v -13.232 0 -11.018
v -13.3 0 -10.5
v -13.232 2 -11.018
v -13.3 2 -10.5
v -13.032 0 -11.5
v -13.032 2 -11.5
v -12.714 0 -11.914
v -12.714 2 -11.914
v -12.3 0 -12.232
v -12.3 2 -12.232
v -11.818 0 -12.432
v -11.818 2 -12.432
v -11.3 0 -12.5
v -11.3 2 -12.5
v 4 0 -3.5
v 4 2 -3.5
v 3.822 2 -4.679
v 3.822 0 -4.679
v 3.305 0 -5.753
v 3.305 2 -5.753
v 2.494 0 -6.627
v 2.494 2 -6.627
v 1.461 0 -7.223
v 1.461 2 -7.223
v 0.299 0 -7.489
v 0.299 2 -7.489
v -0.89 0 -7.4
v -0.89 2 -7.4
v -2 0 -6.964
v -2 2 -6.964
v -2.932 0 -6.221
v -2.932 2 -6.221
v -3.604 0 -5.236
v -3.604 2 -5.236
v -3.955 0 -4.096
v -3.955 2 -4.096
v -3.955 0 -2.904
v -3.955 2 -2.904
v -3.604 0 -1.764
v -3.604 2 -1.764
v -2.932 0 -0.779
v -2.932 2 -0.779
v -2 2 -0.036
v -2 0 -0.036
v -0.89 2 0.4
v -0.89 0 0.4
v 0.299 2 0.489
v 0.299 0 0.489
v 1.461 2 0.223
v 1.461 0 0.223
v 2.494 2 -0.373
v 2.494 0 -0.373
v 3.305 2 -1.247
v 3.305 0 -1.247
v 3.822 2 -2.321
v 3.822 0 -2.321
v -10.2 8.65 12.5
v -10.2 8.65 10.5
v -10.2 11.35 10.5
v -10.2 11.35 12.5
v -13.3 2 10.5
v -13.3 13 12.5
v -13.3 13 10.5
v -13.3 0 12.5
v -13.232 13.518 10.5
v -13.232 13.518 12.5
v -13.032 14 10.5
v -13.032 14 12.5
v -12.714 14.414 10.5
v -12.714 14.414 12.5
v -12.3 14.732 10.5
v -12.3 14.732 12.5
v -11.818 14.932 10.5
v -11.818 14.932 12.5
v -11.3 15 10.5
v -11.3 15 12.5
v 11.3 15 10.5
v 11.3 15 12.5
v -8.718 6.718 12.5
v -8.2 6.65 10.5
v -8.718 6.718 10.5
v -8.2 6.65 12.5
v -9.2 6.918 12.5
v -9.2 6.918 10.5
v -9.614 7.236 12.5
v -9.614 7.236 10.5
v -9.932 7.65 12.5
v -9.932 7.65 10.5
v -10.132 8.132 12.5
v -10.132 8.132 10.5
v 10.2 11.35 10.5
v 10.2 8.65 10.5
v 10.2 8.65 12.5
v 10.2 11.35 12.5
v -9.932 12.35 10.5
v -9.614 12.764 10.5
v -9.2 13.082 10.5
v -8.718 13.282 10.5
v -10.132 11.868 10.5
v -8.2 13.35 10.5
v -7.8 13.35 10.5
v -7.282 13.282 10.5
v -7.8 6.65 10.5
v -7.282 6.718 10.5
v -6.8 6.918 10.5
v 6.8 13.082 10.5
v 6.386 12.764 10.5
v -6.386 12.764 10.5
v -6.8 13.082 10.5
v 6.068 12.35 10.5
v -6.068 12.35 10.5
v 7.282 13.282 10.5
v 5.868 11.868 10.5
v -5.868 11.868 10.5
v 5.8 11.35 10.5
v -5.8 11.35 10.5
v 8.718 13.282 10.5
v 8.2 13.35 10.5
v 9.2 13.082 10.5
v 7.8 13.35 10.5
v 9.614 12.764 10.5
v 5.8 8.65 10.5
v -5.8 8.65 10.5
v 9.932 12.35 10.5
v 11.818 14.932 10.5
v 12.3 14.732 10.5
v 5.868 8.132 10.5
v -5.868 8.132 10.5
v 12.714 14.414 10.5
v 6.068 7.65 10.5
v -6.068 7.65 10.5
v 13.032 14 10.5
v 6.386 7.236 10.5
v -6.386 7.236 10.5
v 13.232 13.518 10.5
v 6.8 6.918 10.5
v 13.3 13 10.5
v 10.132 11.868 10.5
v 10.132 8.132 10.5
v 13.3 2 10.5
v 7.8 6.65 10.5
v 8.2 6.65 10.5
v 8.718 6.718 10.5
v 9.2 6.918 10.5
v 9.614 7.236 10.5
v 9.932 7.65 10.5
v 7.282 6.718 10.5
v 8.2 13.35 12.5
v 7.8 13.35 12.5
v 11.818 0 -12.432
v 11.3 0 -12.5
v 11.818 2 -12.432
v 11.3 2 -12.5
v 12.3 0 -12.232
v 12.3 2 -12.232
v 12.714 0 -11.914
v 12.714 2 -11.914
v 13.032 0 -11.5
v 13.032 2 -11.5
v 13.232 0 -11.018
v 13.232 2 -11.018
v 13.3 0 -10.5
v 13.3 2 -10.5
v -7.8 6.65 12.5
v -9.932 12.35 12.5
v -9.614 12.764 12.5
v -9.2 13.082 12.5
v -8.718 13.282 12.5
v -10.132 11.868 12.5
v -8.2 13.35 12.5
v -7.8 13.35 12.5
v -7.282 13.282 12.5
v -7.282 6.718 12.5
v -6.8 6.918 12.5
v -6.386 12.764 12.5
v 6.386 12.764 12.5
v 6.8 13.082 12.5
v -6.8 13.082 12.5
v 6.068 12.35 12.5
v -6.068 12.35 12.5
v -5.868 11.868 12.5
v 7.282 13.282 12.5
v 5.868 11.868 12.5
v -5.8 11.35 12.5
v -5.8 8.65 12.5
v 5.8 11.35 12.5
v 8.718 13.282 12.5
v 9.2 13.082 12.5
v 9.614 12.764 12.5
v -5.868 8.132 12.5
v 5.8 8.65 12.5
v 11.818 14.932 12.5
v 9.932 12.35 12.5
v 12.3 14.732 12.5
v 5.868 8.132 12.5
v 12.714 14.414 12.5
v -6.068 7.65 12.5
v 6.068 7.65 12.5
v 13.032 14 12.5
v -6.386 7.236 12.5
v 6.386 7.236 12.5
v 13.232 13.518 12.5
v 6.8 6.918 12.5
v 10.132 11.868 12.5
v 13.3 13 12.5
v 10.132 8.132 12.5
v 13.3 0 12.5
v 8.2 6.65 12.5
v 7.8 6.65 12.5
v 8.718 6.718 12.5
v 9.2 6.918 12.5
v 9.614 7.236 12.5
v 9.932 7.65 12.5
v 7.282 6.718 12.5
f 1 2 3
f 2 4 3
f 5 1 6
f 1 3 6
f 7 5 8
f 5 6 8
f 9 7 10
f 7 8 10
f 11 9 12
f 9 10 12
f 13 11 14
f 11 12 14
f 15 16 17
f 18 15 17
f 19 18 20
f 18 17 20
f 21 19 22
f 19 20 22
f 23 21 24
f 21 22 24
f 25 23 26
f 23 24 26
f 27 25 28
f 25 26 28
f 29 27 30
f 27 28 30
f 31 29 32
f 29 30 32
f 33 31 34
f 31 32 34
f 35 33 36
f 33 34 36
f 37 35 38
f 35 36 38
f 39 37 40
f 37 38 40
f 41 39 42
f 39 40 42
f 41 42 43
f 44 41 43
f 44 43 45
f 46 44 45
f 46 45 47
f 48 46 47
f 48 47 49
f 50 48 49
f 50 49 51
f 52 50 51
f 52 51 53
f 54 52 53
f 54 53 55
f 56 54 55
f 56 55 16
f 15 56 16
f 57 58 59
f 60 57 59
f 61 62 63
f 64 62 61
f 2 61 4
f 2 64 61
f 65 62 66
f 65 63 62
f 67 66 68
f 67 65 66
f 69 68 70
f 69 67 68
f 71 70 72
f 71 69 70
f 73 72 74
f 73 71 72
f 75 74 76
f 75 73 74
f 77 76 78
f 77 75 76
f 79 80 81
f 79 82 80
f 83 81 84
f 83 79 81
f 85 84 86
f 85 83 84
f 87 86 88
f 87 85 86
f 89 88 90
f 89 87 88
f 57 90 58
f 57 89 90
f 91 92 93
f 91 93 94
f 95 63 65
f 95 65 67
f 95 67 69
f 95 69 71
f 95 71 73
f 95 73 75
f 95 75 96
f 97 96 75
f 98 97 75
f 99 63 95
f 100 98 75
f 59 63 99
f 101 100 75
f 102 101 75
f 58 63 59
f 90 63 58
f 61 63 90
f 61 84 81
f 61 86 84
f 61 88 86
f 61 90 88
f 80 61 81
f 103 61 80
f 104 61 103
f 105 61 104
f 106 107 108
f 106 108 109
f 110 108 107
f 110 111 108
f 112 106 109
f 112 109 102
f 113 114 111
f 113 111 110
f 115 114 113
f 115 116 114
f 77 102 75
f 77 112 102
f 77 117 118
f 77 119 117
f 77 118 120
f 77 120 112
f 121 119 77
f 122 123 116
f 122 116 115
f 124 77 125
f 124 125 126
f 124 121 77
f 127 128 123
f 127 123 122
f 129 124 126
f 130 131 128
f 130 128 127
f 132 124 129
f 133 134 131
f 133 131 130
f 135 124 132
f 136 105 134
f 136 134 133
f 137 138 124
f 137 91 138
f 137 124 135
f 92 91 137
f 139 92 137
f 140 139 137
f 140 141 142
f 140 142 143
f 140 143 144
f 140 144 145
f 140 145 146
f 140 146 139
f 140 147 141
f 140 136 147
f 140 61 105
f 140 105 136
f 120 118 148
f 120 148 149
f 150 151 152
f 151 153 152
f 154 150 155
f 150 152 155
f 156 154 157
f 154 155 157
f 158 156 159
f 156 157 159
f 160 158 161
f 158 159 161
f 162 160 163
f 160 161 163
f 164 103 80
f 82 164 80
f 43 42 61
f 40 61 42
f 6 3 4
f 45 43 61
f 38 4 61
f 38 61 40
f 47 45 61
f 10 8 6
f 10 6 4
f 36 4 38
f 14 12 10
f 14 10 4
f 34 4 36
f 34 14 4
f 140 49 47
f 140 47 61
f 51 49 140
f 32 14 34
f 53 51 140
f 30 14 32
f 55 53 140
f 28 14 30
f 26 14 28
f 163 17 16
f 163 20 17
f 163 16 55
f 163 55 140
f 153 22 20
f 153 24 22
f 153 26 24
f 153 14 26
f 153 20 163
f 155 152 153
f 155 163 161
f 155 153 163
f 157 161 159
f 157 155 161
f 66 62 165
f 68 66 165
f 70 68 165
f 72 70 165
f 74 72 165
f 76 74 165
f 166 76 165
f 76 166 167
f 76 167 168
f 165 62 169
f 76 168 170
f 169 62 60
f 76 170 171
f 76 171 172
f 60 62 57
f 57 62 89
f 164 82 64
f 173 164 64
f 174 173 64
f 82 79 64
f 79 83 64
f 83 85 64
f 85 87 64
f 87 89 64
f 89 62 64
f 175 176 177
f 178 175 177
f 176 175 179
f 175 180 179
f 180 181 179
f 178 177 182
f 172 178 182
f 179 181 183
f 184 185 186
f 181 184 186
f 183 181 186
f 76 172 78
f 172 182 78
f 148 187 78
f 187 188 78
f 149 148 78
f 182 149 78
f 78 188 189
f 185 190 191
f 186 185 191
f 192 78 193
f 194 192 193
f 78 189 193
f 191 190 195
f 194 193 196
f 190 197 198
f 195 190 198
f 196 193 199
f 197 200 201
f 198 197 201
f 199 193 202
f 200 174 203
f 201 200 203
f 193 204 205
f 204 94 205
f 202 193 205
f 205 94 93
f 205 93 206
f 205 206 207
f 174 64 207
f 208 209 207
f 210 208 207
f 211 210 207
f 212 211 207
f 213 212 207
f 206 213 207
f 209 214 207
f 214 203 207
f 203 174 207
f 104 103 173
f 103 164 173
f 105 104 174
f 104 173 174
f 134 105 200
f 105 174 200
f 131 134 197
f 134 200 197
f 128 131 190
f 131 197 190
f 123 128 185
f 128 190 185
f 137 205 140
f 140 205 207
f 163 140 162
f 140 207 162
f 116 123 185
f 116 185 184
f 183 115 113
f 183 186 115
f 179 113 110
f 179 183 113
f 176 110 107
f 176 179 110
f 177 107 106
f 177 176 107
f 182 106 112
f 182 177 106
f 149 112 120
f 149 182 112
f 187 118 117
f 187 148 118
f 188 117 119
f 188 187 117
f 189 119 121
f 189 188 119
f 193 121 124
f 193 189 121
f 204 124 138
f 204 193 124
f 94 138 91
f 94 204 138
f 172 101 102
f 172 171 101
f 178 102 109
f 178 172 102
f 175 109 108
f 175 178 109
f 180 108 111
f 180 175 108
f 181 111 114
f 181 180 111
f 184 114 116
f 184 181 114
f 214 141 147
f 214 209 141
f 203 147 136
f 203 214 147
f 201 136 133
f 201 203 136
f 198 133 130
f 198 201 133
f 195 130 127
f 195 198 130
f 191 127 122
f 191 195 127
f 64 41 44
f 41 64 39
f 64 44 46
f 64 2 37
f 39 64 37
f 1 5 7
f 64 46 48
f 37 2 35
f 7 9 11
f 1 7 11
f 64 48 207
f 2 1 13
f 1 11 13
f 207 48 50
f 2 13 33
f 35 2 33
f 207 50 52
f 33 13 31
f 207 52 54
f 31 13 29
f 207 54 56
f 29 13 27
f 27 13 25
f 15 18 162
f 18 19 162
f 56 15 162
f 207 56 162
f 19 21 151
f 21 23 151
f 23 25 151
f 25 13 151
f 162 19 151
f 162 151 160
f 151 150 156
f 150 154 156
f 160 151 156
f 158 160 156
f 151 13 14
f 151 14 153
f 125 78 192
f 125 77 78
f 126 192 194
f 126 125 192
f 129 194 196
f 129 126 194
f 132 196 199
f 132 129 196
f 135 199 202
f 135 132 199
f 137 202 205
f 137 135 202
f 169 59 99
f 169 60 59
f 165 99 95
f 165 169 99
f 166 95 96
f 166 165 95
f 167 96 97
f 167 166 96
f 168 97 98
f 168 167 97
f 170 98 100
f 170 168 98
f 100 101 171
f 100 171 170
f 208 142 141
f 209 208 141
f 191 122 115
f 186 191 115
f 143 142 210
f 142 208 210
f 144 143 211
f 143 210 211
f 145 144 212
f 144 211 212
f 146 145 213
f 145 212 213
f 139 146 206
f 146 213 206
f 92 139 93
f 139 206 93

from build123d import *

# Parameters (mm, degrees)
SKETCH1_W           = 26.6
SKETCH1_H           = 25
BOSS_EXTRUDE1_DEPTH = 2
SKETCH2_W           = 26.6
SKETCH2_H           = 2
BOSS_EXTRUDE2_DEPTH = 13
SKETCH3_W           = 4.4
SKETCH3_H           = 6.7
CUT_EXTRUDE1_DEPTH  = 3
FILLET1_R           = 2
SKETCH4_R           = 4
CUT_EXTRUDE2_DEPTH  = 3


with BuildPart() as part:
    # Sketch1 → Boss-Extrude1 (new body)
    with BuildSketch(Plane(origin=(0, 0, 0), x_dir=(1, 0, 0), z_dir=(0, 1, 0))):
        Rectangle(SKETCH1_W, SKETCH1_H)
    extrude(amount=BOSS_EXTRUDE1_DEPTH)

    # Sketch2 → Boss-Extrude2 (add)
    with BuildSketch(Plane(origin=(0, 2, 0), x_dir=(1, 0, 0), z_dir=(0, 1, 0))):
        with Locations((0, -11.5)):
            Rectangle(SKETCH2_W, SKETCH2_H)
    extrude(amount=BOSS_EXTRUDE2_DEPTH)

    # Sketch3 → Cut-Extrude1 (cut, through all)
    with BuildSketch(Plane(origin=(0, 0, 10.5), x_dir=(-1, 0, 0), z_dir=(0, 0, -1))):
        with Locations((-8, 10)):
            Rectangle(SKETCH3_W, SKETCH3_H)
        with Locations((8, 10)):
            Rectangle(SKETCH3_W, SKETCH3_H)
    extrude(amount=-CUT_EXTRUDE1_DEPTH, mode=Mode.SUBTRACT)

    # Fillet1
    fillet1_edges = [part.edges().sort_by_distance(p)[0] for p in [
        (-13.3, 1, -12.5),
        (13.3, 1, -12.5),
        (5.8, 6.65, 11.5),
        (10.2, 6.65, 11.5),
        (-10.2, 6.65, 11.5),
        (-5.8, 6.65, 11.5),
        (-10.2, 13.35, 11.5),
        (-5.8, 13.35, 11.5),
        (5.8, 13.35, 11.5),
        (10.2, 13.35, 11.5),
        (13.3, 15, 11.5),
        (-13.3, 15, 11.5),
    ]]
    fillet(fillet1_edges, radius=FILLET1_R)

    # Sketch4 → Cut-Extrude2 (cut, through all)
    with BuildSketch(Plane(origin=(0, 2, 0), x_dir=(1, 0, 0), z_dir=(0, 1, 0))):
        with Locations((0, 3.5)):
            Circle(SKETCH4_R)
    extrude(amount=-CUT_EXTRUDE2_DEPTH, mode=Mode.SUBTRACT)


solid = part.part
